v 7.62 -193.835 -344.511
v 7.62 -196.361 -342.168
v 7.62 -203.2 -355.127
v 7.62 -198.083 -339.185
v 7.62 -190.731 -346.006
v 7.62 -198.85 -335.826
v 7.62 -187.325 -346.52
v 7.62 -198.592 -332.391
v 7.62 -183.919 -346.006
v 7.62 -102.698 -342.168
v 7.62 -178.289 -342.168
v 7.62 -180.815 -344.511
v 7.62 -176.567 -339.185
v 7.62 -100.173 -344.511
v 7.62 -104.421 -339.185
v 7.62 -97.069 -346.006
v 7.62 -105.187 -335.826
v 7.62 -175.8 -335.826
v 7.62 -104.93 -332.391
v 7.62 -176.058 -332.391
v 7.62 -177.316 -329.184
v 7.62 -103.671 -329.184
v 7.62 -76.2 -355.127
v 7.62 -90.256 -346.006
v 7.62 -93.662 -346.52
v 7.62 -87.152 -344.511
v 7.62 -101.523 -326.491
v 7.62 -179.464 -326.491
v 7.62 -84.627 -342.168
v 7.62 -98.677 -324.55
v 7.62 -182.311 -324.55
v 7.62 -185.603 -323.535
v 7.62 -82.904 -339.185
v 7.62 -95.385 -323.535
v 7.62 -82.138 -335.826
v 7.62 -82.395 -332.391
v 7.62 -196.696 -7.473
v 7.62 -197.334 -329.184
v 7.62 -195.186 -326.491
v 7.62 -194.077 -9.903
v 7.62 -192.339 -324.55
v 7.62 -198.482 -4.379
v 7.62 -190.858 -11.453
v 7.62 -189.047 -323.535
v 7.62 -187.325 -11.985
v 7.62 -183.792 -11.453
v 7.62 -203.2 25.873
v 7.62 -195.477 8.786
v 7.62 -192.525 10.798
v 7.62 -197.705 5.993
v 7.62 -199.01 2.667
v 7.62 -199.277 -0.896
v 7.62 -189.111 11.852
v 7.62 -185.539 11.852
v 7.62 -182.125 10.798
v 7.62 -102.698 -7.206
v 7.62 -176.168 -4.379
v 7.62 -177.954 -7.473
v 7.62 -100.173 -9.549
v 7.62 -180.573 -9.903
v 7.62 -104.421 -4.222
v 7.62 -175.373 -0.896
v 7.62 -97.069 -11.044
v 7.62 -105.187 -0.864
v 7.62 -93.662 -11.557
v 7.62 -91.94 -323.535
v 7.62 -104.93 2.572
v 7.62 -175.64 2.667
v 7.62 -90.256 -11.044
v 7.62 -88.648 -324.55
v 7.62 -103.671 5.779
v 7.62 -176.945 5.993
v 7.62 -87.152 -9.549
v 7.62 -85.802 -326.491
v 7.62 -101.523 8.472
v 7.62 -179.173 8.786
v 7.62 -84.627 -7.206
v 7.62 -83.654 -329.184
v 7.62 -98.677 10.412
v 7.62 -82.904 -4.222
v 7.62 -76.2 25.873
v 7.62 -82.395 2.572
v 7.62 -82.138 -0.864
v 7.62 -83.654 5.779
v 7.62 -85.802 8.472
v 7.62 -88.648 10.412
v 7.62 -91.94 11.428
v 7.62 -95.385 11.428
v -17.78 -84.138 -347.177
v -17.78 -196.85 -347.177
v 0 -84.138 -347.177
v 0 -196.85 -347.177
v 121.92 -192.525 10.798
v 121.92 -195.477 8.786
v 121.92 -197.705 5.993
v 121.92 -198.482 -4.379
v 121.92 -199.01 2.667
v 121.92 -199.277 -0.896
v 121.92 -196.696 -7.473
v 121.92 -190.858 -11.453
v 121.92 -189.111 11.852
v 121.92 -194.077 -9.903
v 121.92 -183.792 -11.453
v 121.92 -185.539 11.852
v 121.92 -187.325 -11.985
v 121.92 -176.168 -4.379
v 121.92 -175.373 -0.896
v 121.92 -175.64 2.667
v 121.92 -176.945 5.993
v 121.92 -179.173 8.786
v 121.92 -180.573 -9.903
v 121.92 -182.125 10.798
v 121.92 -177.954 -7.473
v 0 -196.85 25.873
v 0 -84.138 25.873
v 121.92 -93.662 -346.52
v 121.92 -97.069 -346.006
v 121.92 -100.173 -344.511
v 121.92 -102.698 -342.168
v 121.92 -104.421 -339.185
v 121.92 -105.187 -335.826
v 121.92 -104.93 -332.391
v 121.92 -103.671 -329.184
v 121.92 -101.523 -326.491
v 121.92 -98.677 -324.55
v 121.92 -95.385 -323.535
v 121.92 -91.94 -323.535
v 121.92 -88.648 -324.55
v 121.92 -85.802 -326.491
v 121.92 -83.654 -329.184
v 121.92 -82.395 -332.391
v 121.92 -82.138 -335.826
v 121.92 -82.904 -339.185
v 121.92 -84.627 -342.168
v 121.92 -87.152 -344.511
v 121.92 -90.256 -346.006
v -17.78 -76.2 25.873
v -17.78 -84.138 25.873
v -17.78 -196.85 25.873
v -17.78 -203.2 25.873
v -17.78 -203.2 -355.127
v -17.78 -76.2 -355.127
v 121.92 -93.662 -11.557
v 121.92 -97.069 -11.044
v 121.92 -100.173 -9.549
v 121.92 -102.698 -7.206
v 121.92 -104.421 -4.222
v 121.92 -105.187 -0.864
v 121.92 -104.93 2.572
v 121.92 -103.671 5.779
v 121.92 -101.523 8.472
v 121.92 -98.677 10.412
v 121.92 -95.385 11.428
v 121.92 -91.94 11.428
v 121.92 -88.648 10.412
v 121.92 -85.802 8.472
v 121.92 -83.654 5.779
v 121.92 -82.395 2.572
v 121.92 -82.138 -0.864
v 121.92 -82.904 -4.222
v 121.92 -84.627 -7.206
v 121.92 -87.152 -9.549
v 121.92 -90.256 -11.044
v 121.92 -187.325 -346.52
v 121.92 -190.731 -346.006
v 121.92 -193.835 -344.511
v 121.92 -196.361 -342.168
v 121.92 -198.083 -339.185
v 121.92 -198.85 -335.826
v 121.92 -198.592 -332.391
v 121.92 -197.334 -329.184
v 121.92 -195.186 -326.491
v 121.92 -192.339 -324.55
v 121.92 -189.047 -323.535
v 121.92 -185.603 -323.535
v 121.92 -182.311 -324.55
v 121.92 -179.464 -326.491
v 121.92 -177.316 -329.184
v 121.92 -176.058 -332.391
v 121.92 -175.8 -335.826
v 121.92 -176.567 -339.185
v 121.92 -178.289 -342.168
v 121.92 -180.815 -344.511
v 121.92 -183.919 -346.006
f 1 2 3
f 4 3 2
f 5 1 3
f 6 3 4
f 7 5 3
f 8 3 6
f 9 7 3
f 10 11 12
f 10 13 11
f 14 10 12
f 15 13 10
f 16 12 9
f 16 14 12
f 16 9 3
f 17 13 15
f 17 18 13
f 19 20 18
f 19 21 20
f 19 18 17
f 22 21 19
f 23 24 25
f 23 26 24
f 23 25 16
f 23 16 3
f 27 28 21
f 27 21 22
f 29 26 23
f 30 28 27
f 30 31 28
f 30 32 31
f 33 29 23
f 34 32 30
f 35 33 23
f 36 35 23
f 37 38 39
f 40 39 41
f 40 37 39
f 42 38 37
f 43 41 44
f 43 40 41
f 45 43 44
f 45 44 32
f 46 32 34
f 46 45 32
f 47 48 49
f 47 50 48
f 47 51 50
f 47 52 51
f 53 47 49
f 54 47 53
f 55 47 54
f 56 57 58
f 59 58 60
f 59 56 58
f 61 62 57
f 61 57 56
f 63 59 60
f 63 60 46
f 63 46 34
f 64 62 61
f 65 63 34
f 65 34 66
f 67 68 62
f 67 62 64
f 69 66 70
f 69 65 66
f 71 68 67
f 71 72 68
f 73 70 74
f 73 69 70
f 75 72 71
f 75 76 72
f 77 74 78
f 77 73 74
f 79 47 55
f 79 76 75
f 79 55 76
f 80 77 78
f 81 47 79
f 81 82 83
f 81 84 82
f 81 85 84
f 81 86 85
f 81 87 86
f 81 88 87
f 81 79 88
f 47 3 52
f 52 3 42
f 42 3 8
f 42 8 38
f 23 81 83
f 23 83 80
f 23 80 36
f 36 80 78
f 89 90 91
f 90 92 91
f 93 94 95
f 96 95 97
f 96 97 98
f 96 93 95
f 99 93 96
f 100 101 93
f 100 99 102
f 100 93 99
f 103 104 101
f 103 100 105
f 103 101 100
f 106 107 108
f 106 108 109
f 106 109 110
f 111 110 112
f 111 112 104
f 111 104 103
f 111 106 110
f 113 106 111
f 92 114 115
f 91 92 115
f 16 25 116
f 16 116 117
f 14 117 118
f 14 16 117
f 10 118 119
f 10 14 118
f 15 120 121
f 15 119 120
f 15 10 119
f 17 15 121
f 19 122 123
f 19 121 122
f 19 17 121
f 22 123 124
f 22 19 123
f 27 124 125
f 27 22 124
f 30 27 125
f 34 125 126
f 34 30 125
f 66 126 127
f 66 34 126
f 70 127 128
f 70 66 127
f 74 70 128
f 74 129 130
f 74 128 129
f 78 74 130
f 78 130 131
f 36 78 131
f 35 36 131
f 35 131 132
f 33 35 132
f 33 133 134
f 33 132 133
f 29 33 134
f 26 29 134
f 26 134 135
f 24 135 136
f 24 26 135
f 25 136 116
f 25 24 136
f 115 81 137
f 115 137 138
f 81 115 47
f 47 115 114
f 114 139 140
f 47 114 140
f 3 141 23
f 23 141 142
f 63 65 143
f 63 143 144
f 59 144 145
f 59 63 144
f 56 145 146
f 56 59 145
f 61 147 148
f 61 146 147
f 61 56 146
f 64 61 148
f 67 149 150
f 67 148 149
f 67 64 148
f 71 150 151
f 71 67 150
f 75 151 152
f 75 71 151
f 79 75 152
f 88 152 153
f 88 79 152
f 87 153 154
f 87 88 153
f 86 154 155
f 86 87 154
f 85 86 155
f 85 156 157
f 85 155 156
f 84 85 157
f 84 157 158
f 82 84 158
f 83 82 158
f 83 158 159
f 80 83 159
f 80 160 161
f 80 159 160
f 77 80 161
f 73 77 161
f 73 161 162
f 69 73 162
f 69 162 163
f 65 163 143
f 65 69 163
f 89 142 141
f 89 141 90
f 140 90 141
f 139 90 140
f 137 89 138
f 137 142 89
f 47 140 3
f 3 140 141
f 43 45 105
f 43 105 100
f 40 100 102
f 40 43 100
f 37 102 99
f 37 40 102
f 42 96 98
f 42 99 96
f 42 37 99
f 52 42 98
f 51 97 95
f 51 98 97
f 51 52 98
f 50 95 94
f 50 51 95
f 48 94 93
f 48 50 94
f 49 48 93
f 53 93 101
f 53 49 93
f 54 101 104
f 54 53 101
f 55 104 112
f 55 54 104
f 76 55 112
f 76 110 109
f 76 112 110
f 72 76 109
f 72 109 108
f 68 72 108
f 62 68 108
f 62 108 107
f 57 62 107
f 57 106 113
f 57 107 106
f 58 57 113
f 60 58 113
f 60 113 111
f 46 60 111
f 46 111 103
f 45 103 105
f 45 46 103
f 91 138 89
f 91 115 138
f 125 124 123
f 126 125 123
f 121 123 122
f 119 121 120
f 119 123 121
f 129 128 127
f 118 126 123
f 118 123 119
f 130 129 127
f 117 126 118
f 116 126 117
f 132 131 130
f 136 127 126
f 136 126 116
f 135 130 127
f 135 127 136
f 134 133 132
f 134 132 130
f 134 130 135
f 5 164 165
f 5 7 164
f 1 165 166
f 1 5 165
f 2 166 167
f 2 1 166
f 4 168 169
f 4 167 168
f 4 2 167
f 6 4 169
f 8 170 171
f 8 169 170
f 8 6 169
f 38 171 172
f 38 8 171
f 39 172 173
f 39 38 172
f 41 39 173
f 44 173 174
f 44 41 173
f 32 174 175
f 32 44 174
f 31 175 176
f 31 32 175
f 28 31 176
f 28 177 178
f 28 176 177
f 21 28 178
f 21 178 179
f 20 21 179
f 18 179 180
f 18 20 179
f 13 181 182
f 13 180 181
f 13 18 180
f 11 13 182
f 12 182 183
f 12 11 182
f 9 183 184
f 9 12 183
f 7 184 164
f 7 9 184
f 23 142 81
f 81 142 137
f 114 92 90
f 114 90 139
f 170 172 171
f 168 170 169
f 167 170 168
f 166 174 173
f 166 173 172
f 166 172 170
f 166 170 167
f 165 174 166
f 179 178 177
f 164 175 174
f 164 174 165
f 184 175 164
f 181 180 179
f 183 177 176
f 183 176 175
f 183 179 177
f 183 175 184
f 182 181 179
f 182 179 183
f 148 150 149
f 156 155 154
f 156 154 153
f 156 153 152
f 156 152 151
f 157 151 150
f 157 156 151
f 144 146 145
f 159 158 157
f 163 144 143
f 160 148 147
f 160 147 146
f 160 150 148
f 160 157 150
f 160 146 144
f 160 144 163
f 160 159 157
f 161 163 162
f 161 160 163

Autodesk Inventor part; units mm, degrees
ref_plane "YZ Plane" through (0, 0, 0) normal (1, 0, 0) x (0, 1, 0)
ref_plane "XZ Plane" through (0, 0, 0) normal (0, 1, 0) x (-1, 0, 0)
ref_plane "XY Plane" through (0, 0, 0) normal (0, 0, 1) x (1, 0, 0)
sketch "Sketch1" plane through (0, 0, 0) normal (1, 0, 0) x (0, 1, 0)
  line L0 (-76.2, 25.8729) -> (-203.2, 25.8729)
  line L1 (-203.2, 25.8729) -> (-203.2, -355.1271)
  line L2 (-203.2, -355.1271) -> (-76.2, -355.1271)
  line L3 (-76.2, -355.1271) -> (-76.2, 25.8729)
  point P0 (0, 0)
  dimension "d0" = 127
  dimension "d1" = 381
extrude "Extrusion1" add sketch "Sketch1" along normal blind 7.62
sketch "Sketch2" plane through (7.62, 0, 0) normal (1, 0, 0) x (0, 0, -1)
  circle A0 centre (0, -187.325) radius 11.9854
  circle A1 centre (334.9625, -187.325) radius 11.557
  point P0 (0, 0)
  dimension "d5" = 23.114
extrude "Extrusion2" add sketch "Sketch2" along normal blind 114.3
sketch "Sketch3" plane through (7.62, 0, 0) normal (1, 0, 0) x (0, 0, -1)
  circle A0 centre (0, -93.6625) radius 11.557
  circle A1 centre (334.9625, -93.6625) radius 11.557
  point P0 (0, 0)
  dimension "d8" = 23.114
  dimension "d9" = 23.114
extrude "Extrusion3" add sketch "Sketch3" along normal blind 114.3
sketch "Sketch4" plane through (0, 0, 0) normal (-1, 0, 0) x (0, 0, 1)
  line L0 (25.8729, -76.2) -> (25.8729, -203.2) projected
  line L1 (-355.1271, -203.2) -> (-355.1271, -76.2) projected
  line L2 (25.8729, -203.2) -> (-355.1271, -203.2)
  line L3 (-355.1271, -203.2) -> (-355.1271, -196.85)
  line L4 (-355.1271, -196.85) -> (25.8729, -196.85)
  line L5 (25.8729, -196.85) -> (25.8729, -203.2)
  line L6 (-355.1271, -76.2) -> (25.8729, -76.2) projected
  line L7 (-355.1271, -196.85) -> (-347.1769, -196.85)
  line L8 (-347.1769, -196.85) -> (-347.1769, -76.2)
  line L9 (-347.1769, -76.2) -> (-355.1271, -76.2)
  line L10 (-355.1271, -76.2) -> (-355.1271, -196.85)
  line L11 (25.8729, -84.1375) -> (-355.1271, -84.1375)
  line L12 (-355.1271, -84.1375) -> (-355.1271, -76.2)
  line L13 (-355.1271, -76.2) -> (25.8729, -76.2)
  line L14 (25.8729, -76.2) -> (25.8729, -84.1375)
  point P0 (0, 0)
  point P1 (25.8729, -196.85)
  point P2 (-347.1769, -84.1375)
  dimension "d12" = 7.9502
extrude "Extrusion4" add sketch "Sketch4" along normal blind 17.78 contours L0 L11 L8 L6 | L8 L11 L1 L6 | L0 L2 L1 L4 | L8 L4 L1 L11
properties part number "TABLE FOR VERTI" material "Wood (Maple)"
